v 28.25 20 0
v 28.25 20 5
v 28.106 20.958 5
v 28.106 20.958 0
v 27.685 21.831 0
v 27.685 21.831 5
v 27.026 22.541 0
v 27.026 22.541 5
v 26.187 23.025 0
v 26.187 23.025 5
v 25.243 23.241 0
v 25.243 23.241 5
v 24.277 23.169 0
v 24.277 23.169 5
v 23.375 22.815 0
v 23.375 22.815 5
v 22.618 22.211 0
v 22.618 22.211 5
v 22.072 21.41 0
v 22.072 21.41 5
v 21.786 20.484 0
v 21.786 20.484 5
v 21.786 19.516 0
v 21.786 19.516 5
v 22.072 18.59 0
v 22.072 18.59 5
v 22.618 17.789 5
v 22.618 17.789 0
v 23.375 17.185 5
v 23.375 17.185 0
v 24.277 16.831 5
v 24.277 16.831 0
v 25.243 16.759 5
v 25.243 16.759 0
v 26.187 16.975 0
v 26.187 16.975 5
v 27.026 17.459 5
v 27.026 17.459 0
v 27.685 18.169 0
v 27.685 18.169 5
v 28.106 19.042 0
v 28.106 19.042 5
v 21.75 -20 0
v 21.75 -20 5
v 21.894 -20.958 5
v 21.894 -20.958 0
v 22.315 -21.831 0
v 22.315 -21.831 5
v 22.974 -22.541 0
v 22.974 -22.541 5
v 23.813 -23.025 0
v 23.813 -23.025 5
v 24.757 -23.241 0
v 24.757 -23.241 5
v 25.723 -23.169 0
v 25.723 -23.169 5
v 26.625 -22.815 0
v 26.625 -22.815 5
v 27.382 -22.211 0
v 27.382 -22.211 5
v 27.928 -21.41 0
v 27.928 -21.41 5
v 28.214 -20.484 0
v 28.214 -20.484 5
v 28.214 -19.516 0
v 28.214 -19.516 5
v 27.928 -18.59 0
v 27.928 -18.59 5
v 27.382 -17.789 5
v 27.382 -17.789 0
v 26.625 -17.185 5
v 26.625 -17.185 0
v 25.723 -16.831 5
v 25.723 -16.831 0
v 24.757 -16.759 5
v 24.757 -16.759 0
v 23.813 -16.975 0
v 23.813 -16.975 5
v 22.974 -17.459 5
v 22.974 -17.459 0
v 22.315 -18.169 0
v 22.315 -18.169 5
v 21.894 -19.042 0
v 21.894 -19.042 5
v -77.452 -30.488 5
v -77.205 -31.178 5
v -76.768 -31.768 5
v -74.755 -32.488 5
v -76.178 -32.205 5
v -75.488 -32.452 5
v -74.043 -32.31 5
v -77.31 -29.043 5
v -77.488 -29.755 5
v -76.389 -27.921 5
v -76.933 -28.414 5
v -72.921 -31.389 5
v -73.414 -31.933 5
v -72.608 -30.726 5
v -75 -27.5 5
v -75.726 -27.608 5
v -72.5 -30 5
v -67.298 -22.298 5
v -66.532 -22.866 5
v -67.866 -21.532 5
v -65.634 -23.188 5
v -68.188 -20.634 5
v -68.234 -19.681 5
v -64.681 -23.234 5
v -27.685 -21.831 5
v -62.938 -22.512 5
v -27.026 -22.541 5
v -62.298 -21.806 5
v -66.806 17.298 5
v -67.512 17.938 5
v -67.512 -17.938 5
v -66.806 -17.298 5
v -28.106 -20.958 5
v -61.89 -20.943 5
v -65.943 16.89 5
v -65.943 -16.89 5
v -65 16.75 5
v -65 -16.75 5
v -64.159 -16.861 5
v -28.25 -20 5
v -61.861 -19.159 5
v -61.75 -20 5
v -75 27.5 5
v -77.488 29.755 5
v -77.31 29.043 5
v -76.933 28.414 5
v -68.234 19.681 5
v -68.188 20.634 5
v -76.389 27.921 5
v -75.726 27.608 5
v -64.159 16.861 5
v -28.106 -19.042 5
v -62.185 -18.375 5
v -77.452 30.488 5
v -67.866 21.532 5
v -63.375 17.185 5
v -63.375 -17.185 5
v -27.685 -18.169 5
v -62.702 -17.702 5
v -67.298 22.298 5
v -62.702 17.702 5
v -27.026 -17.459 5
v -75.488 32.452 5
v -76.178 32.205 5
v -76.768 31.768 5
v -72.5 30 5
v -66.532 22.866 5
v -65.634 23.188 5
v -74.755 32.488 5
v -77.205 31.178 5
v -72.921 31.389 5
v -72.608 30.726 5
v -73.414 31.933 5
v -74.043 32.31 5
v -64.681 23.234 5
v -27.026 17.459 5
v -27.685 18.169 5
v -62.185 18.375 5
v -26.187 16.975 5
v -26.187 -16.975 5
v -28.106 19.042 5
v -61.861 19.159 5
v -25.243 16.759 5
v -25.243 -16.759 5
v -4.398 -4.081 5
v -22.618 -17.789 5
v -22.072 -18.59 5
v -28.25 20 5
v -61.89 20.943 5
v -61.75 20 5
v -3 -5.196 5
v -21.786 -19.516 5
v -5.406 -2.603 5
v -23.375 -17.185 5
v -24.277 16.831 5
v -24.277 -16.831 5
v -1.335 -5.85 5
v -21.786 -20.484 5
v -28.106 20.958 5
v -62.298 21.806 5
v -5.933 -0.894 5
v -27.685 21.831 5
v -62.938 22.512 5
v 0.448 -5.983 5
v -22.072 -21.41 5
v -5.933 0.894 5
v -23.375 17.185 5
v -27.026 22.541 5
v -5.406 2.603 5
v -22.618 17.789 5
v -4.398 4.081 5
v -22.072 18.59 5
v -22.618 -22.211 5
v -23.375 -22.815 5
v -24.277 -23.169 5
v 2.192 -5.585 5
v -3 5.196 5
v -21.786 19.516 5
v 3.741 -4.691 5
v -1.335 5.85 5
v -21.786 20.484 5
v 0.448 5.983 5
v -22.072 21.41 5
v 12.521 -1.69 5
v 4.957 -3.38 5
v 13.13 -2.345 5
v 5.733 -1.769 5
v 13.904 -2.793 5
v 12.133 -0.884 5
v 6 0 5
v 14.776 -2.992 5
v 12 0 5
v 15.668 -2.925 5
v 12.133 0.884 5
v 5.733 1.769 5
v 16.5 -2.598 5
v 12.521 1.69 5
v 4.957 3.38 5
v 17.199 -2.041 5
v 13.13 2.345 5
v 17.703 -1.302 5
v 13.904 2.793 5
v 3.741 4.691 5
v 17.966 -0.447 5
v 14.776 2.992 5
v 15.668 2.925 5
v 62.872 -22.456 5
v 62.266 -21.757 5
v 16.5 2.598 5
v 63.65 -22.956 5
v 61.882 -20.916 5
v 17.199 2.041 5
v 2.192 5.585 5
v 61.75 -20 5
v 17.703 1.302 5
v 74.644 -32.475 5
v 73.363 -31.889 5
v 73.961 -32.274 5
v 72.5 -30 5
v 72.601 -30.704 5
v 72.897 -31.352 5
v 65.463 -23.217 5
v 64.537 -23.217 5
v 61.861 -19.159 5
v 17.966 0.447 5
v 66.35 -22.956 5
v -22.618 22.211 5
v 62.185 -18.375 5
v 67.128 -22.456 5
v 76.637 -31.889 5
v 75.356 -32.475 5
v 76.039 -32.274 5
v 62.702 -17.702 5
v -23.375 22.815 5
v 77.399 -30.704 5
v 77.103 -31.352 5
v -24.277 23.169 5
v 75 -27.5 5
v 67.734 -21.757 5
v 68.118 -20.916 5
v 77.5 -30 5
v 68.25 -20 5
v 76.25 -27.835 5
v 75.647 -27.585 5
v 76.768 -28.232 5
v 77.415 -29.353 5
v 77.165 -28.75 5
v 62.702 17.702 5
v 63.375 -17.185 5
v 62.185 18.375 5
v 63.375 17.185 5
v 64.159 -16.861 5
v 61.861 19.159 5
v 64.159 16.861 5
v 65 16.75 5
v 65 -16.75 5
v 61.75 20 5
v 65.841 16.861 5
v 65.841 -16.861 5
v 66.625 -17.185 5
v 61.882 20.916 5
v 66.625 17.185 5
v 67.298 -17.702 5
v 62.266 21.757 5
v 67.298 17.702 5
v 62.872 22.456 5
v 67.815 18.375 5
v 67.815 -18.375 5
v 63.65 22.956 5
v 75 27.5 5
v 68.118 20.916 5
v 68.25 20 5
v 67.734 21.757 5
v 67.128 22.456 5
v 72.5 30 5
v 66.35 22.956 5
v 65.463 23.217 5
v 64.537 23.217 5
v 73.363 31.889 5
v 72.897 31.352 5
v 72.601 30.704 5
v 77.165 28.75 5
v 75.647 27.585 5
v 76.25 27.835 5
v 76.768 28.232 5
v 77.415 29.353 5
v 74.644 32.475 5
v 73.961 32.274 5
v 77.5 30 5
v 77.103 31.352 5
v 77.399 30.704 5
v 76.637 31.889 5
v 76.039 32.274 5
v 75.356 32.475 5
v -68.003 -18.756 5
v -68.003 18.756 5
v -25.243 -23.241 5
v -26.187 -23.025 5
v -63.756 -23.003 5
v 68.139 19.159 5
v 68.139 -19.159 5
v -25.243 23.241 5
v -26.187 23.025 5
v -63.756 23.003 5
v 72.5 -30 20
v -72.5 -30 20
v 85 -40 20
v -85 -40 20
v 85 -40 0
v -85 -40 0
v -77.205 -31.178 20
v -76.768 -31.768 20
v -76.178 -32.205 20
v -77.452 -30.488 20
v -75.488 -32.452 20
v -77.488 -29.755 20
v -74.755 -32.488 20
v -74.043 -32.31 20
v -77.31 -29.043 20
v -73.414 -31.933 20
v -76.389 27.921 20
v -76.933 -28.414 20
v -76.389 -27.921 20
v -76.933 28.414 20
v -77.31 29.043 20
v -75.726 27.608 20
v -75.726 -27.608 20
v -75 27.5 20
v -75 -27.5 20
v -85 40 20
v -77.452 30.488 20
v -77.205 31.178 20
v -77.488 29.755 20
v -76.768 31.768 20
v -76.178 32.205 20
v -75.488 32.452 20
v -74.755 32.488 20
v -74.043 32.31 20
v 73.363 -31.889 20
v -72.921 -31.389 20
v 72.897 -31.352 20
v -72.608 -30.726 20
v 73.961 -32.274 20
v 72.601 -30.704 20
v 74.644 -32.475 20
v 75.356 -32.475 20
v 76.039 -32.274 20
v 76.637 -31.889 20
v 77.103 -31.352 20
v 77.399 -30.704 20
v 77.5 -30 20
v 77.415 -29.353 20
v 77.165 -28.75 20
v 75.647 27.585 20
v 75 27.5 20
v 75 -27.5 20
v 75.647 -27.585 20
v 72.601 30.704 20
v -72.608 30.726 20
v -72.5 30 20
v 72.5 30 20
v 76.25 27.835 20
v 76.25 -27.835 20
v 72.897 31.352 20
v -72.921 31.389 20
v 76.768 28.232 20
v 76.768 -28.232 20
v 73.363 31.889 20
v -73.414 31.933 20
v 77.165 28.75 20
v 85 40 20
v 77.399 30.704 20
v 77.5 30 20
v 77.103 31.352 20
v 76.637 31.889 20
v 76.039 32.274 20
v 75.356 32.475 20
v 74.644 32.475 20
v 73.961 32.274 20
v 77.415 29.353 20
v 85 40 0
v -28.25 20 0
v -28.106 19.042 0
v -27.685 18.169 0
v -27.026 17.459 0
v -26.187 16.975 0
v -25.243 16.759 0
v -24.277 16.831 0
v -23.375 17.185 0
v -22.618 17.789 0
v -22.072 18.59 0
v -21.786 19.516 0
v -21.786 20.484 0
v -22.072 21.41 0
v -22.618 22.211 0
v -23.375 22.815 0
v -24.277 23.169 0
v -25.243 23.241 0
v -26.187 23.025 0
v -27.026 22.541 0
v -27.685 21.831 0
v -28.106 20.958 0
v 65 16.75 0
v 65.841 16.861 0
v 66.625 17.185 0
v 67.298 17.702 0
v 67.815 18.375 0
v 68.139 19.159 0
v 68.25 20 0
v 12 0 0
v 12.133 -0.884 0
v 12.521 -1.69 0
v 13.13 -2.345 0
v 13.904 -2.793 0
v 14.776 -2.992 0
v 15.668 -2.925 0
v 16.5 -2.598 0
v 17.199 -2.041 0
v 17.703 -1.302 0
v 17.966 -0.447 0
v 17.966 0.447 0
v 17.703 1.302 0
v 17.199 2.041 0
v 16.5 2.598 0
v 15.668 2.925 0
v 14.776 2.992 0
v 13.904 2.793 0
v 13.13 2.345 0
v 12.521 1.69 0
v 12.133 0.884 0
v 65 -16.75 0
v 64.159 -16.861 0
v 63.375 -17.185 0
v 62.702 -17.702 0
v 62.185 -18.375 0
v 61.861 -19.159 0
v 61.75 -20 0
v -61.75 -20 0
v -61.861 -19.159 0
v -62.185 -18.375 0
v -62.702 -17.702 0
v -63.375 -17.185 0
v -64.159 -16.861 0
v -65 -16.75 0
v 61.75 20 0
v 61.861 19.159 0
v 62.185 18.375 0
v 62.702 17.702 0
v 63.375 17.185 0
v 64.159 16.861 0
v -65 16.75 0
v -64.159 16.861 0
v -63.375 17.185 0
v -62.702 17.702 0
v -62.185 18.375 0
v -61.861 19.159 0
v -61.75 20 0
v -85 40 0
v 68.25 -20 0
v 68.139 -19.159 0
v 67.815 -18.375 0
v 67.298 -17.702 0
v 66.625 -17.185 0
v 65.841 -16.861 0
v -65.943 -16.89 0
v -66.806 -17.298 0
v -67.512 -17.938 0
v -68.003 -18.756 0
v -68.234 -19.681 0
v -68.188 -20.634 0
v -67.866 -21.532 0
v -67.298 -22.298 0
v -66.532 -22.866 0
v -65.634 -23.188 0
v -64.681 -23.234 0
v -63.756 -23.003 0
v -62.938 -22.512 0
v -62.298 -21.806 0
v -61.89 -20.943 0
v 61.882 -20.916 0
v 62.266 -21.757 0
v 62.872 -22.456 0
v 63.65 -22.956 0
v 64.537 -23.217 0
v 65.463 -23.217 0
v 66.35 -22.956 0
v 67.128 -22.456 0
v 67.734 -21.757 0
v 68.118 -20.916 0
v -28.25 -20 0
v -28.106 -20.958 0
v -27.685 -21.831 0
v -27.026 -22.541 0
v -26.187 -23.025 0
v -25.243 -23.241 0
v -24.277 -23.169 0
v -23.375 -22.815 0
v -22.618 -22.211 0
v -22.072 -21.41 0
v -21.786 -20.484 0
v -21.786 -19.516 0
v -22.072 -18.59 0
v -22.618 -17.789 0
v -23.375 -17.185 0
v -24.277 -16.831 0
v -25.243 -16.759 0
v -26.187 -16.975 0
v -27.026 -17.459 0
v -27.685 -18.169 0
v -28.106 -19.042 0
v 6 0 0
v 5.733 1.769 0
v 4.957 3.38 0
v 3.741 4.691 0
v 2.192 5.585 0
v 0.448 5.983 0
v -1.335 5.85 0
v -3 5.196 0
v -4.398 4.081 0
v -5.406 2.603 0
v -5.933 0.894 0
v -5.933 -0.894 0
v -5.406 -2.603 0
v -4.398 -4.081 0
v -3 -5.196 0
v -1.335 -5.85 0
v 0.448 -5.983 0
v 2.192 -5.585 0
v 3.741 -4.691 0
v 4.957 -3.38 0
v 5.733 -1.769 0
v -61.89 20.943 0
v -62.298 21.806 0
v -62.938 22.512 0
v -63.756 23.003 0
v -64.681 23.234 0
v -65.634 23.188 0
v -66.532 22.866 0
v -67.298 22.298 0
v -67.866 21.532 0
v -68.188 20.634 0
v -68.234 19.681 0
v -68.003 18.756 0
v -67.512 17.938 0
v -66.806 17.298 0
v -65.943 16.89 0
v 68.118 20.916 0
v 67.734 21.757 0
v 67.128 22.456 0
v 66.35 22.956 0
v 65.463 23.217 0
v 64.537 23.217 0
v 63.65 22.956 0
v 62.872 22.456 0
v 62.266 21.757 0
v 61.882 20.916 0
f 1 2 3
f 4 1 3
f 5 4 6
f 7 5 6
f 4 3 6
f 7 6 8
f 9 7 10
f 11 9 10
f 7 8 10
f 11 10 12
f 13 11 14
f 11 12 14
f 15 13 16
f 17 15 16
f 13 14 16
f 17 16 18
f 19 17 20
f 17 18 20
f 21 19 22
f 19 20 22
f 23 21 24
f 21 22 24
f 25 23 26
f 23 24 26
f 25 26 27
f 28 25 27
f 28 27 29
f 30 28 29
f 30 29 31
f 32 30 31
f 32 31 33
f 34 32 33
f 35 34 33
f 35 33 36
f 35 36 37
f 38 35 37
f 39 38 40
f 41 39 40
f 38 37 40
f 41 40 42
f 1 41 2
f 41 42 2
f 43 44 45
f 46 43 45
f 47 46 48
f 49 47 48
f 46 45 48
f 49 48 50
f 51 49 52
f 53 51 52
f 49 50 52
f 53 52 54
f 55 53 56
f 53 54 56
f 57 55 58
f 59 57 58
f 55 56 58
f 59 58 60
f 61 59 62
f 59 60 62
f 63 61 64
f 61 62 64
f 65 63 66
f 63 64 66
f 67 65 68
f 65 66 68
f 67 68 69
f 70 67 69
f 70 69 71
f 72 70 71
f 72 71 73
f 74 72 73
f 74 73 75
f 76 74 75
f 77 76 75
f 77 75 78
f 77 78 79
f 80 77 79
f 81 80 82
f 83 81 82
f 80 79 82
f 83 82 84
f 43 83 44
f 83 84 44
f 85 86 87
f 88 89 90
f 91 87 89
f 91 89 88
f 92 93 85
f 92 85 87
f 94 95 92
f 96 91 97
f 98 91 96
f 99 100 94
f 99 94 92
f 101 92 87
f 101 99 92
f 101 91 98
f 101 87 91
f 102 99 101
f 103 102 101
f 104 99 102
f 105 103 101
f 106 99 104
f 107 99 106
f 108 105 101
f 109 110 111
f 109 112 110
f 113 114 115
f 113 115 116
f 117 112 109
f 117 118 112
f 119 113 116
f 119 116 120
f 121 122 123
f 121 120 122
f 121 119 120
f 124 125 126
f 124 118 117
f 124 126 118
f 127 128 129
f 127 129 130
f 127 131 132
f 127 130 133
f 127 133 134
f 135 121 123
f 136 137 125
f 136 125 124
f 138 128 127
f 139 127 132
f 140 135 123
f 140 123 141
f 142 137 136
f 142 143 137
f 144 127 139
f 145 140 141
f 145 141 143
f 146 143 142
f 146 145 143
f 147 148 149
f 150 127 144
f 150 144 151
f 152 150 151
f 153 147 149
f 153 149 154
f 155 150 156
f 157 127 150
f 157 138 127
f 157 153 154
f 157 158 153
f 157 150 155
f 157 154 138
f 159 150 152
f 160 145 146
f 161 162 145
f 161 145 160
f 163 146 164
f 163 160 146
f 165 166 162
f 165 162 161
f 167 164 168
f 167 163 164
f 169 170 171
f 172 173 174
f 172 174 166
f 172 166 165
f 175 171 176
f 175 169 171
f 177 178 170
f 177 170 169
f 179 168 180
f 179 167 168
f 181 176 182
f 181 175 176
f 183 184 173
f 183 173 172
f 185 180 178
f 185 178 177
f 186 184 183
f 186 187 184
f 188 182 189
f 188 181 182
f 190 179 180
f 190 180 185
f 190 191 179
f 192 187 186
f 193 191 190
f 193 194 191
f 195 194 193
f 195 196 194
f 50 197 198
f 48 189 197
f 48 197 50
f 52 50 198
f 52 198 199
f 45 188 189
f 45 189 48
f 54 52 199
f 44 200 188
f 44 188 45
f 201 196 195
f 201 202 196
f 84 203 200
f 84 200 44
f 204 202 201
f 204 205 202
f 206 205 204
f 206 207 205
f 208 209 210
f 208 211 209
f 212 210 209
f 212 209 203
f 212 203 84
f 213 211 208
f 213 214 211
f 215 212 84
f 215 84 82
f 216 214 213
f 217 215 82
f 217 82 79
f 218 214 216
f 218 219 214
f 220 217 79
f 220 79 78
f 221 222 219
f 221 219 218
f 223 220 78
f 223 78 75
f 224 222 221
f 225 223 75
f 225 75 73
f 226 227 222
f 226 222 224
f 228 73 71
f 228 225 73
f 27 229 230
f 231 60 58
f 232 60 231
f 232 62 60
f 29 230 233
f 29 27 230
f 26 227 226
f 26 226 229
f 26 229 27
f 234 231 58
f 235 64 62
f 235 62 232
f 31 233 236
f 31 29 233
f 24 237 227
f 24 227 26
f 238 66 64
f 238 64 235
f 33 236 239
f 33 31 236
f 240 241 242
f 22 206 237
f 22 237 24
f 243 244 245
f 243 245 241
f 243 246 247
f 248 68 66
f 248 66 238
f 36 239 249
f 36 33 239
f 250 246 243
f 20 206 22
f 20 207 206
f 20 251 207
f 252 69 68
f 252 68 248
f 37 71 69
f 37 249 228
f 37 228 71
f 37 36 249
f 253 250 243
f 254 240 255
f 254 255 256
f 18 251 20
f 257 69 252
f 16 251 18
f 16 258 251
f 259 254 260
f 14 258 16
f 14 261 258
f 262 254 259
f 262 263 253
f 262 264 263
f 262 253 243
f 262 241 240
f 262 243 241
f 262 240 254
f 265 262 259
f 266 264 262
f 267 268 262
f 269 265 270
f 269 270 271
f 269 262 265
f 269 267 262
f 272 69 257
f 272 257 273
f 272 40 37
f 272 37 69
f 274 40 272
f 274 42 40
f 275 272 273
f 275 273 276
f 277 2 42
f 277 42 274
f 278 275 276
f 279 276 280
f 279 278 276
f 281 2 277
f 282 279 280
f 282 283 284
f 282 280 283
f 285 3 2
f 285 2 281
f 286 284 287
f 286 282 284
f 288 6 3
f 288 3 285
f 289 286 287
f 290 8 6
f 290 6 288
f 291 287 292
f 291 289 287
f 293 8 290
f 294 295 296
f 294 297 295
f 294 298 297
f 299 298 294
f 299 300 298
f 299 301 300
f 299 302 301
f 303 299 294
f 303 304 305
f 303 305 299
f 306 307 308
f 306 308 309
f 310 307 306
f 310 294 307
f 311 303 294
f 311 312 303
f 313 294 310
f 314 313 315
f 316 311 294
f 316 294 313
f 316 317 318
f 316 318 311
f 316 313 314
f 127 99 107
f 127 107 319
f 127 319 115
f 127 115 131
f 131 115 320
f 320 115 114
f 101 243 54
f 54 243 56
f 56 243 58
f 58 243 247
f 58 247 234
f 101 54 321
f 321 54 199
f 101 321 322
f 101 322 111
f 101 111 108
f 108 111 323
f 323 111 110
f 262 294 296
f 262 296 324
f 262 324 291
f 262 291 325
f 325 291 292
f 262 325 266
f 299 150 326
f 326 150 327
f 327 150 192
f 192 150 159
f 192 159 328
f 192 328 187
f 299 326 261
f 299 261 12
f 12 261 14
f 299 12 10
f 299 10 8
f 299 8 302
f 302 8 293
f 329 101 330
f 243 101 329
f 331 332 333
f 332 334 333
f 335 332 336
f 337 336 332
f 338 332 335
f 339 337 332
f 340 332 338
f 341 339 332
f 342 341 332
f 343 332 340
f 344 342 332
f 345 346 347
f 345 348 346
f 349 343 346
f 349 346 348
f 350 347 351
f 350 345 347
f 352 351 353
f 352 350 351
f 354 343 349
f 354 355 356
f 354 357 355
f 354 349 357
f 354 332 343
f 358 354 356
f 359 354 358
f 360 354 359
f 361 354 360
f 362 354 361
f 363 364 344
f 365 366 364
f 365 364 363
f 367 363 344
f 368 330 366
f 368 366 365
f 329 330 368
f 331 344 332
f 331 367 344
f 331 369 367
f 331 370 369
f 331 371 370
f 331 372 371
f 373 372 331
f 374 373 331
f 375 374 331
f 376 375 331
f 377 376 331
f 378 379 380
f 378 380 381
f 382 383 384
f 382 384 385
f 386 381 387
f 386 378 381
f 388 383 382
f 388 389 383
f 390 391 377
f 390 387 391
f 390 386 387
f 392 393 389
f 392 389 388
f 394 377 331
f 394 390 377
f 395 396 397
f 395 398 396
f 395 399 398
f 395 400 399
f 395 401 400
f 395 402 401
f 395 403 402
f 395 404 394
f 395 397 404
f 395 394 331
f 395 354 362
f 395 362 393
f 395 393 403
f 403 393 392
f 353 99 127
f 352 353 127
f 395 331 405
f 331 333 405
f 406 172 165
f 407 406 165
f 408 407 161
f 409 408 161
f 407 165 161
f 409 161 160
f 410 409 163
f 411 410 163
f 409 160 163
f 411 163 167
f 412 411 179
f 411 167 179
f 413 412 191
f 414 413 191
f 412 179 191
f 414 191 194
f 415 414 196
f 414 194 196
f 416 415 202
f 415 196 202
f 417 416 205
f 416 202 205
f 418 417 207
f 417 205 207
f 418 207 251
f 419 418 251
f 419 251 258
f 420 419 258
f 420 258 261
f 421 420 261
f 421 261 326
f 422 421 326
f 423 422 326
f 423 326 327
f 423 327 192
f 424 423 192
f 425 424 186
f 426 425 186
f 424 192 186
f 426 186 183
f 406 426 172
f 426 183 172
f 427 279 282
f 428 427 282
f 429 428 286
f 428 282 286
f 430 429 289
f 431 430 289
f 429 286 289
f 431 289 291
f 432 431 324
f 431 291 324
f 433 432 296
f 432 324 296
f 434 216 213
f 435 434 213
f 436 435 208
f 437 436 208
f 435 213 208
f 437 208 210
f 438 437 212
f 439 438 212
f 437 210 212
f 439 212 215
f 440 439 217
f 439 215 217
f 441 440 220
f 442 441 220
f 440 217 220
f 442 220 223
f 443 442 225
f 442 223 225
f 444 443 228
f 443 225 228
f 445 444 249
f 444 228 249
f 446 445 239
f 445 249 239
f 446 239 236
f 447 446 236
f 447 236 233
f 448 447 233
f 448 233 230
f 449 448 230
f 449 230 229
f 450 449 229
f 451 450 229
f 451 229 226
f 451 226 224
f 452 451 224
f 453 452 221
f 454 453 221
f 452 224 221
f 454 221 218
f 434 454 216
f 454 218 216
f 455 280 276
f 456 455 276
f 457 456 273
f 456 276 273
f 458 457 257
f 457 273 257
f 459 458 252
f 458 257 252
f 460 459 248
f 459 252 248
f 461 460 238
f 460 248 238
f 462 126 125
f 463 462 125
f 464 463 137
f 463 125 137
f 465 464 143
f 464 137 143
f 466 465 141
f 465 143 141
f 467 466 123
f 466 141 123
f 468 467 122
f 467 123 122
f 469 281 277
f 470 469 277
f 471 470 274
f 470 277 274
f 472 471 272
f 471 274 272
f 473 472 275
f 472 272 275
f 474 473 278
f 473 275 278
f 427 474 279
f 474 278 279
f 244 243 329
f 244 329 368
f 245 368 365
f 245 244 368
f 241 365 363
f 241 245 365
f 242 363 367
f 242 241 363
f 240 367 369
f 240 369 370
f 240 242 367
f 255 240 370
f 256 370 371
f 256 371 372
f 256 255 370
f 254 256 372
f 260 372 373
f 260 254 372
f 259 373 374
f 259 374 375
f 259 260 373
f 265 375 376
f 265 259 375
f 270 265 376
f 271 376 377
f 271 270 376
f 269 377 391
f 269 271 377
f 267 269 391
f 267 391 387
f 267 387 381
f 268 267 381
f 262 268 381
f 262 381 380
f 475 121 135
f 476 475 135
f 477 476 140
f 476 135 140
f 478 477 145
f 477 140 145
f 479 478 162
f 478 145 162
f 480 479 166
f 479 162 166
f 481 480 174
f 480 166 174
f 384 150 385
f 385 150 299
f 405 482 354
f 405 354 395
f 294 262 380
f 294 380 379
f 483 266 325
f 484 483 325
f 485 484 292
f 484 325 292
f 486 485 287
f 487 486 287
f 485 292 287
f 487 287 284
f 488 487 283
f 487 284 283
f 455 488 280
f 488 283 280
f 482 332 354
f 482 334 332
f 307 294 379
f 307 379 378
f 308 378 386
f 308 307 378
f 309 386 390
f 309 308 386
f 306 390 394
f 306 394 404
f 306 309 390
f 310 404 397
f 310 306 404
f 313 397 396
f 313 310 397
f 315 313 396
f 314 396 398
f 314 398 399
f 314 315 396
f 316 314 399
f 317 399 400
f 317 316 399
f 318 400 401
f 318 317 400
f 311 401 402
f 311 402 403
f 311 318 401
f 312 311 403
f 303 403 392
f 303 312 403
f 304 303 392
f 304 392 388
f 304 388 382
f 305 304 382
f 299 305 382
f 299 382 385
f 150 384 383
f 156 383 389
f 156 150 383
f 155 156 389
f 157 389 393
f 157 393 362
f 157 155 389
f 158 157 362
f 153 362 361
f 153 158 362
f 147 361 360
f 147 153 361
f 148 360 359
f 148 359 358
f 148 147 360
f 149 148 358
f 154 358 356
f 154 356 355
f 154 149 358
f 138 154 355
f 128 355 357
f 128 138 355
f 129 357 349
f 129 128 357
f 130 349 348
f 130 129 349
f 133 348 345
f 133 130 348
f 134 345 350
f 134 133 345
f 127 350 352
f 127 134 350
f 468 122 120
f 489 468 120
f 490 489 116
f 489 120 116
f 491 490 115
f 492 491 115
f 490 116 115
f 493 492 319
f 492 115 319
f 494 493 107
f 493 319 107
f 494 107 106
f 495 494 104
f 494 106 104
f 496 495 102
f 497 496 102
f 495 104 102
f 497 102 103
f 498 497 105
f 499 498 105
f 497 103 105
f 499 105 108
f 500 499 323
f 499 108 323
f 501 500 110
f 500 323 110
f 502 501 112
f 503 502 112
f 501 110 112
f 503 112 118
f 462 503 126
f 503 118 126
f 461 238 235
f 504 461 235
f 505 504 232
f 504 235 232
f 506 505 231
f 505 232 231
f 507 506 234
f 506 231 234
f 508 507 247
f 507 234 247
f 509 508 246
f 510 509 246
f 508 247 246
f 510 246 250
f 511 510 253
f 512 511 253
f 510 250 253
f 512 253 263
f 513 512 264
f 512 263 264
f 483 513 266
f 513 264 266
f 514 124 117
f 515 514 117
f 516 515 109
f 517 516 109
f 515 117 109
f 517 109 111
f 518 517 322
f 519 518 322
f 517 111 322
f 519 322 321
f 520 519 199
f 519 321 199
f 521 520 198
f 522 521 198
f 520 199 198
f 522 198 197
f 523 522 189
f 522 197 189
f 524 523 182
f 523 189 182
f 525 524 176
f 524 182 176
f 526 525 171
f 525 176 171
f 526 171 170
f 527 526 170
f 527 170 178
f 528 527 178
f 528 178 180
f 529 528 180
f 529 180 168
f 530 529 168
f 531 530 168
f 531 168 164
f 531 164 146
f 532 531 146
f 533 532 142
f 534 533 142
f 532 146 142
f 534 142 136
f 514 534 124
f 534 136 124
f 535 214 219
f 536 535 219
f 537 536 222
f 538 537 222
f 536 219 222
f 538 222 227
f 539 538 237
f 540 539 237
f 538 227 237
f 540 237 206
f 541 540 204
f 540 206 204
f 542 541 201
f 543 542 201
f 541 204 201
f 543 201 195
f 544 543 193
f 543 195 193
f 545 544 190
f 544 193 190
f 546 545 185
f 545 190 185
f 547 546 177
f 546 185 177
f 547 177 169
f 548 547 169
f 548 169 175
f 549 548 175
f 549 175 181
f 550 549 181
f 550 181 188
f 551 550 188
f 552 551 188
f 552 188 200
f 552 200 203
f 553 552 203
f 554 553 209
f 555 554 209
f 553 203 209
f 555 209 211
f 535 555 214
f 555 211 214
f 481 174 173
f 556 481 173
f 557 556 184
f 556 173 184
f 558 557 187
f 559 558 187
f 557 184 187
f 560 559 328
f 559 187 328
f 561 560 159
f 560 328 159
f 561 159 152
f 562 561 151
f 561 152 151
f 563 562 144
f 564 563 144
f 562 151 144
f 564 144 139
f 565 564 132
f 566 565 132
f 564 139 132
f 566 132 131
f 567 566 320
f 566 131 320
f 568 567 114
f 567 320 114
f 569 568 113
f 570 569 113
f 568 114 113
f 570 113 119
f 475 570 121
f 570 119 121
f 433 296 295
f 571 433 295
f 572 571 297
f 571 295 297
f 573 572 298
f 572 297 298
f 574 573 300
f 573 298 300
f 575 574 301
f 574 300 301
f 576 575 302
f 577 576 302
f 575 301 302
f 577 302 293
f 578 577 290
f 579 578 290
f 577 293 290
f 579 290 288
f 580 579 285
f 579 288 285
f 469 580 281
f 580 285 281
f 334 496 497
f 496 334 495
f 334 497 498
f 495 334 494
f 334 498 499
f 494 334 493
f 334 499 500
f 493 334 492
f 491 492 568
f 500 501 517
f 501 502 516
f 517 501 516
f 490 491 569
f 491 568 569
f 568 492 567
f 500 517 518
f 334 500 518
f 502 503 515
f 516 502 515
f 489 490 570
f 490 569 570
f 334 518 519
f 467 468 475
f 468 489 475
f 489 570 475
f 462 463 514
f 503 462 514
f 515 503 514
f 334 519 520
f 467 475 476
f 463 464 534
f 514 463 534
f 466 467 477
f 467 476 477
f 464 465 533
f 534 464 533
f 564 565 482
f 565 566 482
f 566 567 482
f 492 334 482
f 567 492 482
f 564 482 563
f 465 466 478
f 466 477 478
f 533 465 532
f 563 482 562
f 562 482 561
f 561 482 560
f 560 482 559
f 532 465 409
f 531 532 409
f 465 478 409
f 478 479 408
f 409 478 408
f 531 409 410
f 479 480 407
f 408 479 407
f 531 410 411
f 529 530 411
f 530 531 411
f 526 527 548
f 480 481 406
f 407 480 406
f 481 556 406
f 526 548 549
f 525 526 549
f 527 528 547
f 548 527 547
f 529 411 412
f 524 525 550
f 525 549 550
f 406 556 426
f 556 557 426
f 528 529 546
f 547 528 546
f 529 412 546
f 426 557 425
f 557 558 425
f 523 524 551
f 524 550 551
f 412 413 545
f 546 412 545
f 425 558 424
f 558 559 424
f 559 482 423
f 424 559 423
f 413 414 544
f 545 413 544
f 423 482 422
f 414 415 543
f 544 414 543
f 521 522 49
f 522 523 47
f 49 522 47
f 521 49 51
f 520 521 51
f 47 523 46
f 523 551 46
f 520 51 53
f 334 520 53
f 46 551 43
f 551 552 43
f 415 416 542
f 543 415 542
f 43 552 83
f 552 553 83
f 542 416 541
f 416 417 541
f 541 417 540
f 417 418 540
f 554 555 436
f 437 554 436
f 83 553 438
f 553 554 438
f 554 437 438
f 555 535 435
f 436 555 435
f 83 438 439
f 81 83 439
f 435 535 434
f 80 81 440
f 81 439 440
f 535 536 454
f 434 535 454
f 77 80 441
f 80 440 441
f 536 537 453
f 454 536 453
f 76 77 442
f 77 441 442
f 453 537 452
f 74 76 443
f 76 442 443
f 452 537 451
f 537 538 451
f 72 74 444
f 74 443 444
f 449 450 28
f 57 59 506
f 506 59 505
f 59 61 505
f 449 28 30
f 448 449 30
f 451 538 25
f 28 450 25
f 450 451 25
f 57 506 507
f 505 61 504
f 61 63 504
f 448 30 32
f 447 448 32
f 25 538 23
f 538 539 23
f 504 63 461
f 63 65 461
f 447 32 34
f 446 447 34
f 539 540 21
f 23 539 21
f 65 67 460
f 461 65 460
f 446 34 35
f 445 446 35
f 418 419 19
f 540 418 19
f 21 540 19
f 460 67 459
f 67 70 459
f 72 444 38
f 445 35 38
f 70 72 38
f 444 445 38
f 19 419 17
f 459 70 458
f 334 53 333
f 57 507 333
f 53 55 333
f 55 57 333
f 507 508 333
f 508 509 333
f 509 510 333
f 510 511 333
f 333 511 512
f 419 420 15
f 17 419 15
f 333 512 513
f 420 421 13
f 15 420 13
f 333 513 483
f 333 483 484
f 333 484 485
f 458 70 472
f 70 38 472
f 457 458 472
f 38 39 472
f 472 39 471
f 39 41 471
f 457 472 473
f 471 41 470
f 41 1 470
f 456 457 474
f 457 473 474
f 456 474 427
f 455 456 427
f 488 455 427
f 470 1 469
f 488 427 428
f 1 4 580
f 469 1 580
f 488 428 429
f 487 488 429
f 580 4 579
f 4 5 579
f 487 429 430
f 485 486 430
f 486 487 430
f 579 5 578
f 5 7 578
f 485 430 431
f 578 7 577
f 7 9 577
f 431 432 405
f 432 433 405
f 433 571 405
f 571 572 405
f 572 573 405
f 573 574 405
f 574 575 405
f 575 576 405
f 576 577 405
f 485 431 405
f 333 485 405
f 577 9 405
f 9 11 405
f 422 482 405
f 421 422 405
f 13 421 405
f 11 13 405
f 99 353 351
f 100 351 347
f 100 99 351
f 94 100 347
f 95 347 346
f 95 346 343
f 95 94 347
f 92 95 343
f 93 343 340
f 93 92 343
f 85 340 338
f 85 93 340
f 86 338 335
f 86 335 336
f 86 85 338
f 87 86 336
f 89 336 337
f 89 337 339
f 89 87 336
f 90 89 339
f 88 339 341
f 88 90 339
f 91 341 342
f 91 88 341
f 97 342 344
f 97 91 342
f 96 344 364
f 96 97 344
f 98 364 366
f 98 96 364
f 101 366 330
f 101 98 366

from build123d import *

# Parameters (mm, degrees)
F0_W     = 170
F0_H     = 80
F1_DEPTH = 10
F2_W     = 150
F2_H     = 60
F3_DEPTH = 5
F5_DEPTH = 5
F6_R     = 6
F7_DEPTH = 5
F8_DEPTH = 10


with BuildPart() as f1:
    # F0 (on Top) → F1 (new body)
    with BuildSketch(Plane.XY):
        Rectangle(F0_W, F0_H)
    extrude(amount=F1_DEPTH)

    # F2 (on face) → F3 (cut)
    with BuildSketch(Plane.XY.offset(10)):
        Rectangle(F2_W, F2_H)
    extrude(amount=-F3_DEPTH, mode=Mode.SUBTRACT)

    # F4 (on face) → F5 (cut)
    with BuildSketch(Plane.XY.offset(10)):
        with BuildLine():
            ThreePointArc((75, 27.5), (76.767766953, 28.232233047), (77.5, 30))
            ThreePointArc((77.5, 30), (75, 32.5), (72.5, 30))
            Line((72.5, 30), (75, 30))
            Line((75, 30), (75, 27.5))
        make_face()
        with BuildLine():
            Line((75, 30), (72.5, 30))
            ThreePointArc((72.5, 30), (73.232233047, 28.232233047), (75, 27.5))
            Line((75, 27.5), (75, 30))
        make_face()
        with BuildLine():
            ThreePointArc((72.5, -30), (75, -32.5), (77.5, -30))
            ThreePointArc((77.5, -30), (76.767766953, -28.232233047), (75, -27.5))
            Line((75, -27.5), (75, -30))
            Line((75, -30), (72.5, -30))
        make_face()
        with BuildLine():
            Line((75, -30), (75, -27.5))
            ThreePointArc((75, -27.5), (73.232233047, -28.232233047), (72.5, -30))
            Line((72.5, -30), (75, -30))
        make_face()
        with BuildLine():
            Line((-75, 30), (-72.5, 30))
            ThreePointArc((-72.5, 30), (-76.767766953, 31.767766953), (-75, 27.5))
            Line((-75, 27.5), (-75, 30))
        make_face()
        with BuildLine():
            ThreePointArc((-75, 27.5), (-73.232233047, 28.232233047), (-72.5, 30))
            Line((-72.5, 30), (-75, 30))
            Line((-75, 30), (-75, 27.5))
        make_face()
        with BuildLine():
            Line((-75, -30), (-72.5, -30))
            ThreePointArc((-72.5, -30), (-73.232233047, -28.232233047), (-75, -27.5))
            Line((-75, -27.5), (-75, -30))
        make_face()
        with BuildLine():
            ThreePointArc((-75, -27.5), (-76.767766953, -31.767766953), (-72.5, -30))
            Line((-72.5, -30), (-75, -30))
            Line((-75, -30), (-75, -27.5))
        make_face()
    extrude(amount=-F5_DEPTH, mode=Mode.SUBTRACT)

    # F6 (on face) → F7 (cut)
    with BuildSketch(Plane.XY.offset(5)):
        with BuildLine():
            Line((-65, -20), (-61.75, -20))
            ThreePointArc((-61.75, -20), (-62.7019029611, -17.7019029611), (-65, -16.75))
            Line((-65, -16.75), (-65, -20))
        make_face()
        with BuildLine():
            Line((65, 20), (65, 16.75))
            ThreePointArc((65, 16.75), (67.2980970389, 17.7019029611), (68.25, 20))
            ThreePointArc((68.25, 20), (65, 23.25), (61.75, 20))
            Line((61.75, 20), (65, 20))
        make_face()
        with BuildLine():
            Line((28.25, 20), (21.75, 20))
            ThreePointArc((21.75, 20), (25, 16.75), (28.25, 20))
        make_face()
        with BuildLine():
            ThreePointArc((-21.75, -20), (-25, -16.75), (-28.25, -20))
            Line((-28.25, -20), (-21.75, -20))
        make_face()
        with BuildLine():
            ThreePointArc((-21.75, 20), (-25, 23.25), (-28.25, 20))
            Line((-28.25, 20), (-21.75, 20))
        make_face()
        with BuildLine():
            ThreePointArc((-61.75, 20), (-67.2980970389, 22.2980970389), (-65, 16.75))
            Line((-65, 16.75), (-65, 20))
            Line((-65, 20), (-61.75, 20))
        make_face()
        with BuildLine():
            ThreePointArc((-65, -16.75), (-67.2980970389, -22.2980970389), (-61.75, -20))
            Line((-61.75, -20), (-65, -20))
            Line((-65, -20), (-65, -16.75))
        make_face()
        with BuildLine():
            ThreePointArc((28.25, -20), (25, -16.75), (21.75, -20))
            Line((21.75, -20), (28.25, -20))
        make_face()
        with BuildLine():
            Line((-65, 20), (-65, 16.75))
            ThreePointArc((-65, 16.75), (-62.7019029611, 17.7019029611), (-61.75, 20))
            Line((-61.75, 20), (-65, 20))
        make_face()
        with BuildLine():
            Line((-21.75, -20), (-28.25, -20))
            ThreePointArc((-28.25, -20), (-25, -23.25), (-21.75, -20))
        make_face()
        with BuildLine():
            Line((-21.75, 20), (-28.25, 20))
            ThreePointArc((-28.25, 20), (-25, 16.75), (-21.75, 20))
        make_face()
        with BuildLine():
            Line((65, -20), (61.75, -20))
            ThreePointArc((61.75, -20), (65, -23.25), (68.25, -20))
            ThreePointArc((68.25, -20), (67.2980970389, -17.7019029611), (65, -16.75))
            Line((65, -16.75), (65, -20))
        make_face()
        with BuildLine():
            ThreePointArc((65, -16.75), (62.7019029611, -17.7019029611), (61.75, -20))
            Line((61.75, -20), (65, -20))
            Line((65, -20), (65, -16.75))
        make_face()
        with BuildLine():
            ThreePointArc((61.75, 20), (62.7019029611, 17.7019029611), (65, 16.75))
            Line((65, 16.75), (65, 20))
            Line((65, 20), (61.75, 20))
        make_face()
        with BuildLine():
            Line((28.25, -20), (21.75, -20))
            ThreePointArc((21.75, -20), (25, -23.25), (28.25, -20))
        make_face()
        with BuildLine():
            ThreePointArc((28.25, 20), (25, 23.25), (21.75, 20))
            Line((21.75, 20), (28.25, 20))
        make_face()
        Circle(F6_R)
        with BuildLine():
            ThreePointArc((18, 0), (15, 3), (12, 0))
            ThreePointArc((12, 0), (15, -3), (18, 0))
        make_face()
    extrude(amount=-F7_DEPTH, mode=Mode.SUBTRACT)

    # F8 (add): a face of the model
    f8_faces = [f1.faces().sort_by_distance(p)[0] for p in [
        (0, -38.1211705772, 10),
    ]]
    extrude(f8_faces, amount=F8_DEPTH)


solid = f1.part
